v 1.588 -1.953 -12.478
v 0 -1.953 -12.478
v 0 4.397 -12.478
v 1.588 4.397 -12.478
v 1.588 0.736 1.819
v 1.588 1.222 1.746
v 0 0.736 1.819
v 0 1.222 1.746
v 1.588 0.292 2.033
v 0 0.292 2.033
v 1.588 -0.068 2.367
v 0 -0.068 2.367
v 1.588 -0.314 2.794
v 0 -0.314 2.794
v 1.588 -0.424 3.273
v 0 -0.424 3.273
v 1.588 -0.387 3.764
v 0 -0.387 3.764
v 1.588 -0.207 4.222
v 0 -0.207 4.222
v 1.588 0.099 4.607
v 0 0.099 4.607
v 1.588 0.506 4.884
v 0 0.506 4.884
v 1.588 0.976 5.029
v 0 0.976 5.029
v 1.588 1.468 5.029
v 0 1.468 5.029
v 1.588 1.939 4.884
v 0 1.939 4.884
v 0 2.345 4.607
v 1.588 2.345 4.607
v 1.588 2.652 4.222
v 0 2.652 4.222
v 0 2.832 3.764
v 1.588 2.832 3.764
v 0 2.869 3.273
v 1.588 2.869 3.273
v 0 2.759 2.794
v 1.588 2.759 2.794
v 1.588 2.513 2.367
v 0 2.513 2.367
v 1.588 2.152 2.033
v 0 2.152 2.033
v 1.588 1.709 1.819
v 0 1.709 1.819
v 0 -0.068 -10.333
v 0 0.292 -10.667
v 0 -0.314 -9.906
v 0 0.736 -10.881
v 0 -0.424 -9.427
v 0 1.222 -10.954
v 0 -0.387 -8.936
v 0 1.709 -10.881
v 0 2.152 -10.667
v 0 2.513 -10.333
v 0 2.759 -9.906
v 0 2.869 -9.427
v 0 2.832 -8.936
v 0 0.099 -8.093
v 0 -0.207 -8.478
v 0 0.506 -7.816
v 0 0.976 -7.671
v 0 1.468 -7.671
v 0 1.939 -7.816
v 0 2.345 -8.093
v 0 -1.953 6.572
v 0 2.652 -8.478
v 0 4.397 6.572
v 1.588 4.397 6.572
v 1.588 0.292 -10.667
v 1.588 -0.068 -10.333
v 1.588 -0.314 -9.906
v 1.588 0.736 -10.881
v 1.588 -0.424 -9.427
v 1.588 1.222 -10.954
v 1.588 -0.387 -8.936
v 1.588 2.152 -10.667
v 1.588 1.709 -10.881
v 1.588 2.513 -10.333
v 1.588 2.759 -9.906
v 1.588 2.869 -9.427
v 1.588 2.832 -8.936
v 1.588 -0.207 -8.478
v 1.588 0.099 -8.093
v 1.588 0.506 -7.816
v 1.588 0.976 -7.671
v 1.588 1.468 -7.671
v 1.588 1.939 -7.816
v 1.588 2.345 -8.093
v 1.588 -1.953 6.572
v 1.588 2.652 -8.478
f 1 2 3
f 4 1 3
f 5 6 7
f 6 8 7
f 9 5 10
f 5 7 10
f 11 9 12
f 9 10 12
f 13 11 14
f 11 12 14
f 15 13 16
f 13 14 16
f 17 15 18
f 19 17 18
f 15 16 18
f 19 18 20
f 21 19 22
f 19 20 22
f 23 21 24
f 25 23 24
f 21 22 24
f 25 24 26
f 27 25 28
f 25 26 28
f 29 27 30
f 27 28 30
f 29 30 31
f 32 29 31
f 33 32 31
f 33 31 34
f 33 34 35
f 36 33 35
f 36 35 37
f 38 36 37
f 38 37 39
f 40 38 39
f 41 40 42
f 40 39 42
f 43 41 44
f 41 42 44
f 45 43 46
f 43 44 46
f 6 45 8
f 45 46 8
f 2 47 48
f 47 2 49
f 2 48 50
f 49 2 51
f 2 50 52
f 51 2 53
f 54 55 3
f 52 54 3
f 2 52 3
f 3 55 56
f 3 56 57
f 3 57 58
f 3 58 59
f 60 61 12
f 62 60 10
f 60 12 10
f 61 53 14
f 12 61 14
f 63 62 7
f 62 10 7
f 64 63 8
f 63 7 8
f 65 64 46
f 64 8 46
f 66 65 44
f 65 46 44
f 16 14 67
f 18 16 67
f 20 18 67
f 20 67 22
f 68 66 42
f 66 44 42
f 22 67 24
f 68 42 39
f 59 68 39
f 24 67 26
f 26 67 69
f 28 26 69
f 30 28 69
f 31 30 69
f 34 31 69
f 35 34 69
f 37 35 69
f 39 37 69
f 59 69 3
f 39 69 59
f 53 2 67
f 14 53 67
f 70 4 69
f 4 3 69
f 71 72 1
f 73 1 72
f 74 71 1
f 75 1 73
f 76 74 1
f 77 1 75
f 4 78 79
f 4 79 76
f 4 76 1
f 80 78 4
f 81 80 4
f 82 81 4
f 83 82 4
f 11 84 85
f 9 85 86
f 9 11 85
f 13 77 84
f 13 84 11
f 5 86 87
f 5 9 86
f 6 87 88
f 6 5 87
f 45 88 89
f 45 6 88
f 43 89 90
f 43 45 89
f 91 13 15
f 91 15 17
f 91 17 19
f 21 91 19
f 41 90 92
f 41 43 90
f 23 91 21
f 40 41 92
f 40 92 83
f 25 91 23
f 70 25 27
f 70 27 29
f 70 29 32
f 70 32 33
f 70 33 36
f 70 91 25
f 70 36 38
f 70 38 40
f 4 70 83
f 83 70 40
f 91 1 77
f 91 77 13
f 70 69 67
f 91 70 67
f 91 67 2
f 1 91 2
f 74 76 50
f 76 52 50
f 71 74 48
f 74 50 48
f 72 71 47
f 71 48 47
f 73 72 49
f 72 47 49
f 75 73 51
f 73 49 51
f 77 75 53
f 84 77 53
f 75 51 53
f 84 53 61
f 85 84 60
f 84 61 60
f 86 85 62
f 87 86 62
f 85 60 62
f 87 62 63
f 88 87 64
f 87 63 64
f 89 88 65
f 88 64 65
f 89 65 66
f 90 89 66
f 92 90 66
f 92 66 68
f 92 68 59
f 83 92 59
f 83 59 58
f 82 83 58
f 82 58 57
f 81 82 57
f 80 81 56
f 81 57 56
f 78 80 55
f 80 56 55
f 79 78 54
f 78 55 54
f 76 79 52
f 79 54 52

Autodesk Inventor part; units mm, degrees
ref_plane "YZ Plane" through (0, 0, 0) normal (1, 0, 0) x (0, 1, 0)
ref_plane "XZ Plane" through (0, 0, 0) normal (0, 1, 0) x (-1, 0, 0)
ref_plane "XY Plane" through (0, 0, 0) normal (0, 0, 1) x (1, 0, 0)
sketch "Sketch1" plane through (0, 0, 0) normal (1, 0, 0) x (0, 1, 0)
  line L0 (4.3974, 6.5718) -> (-1.9526, 6.5718)
  line L1 (-1.9526, 6.5718) -> (-1.9526, -12.4782)
  line L2 (-1.9526, -12.4782) -> (4.3974, -12.4782)
  line L3 (4.3974, -12.4782) -> (4.3974, 6.5718)
  point P0 (0, 0)
  dimension "d0" = 19.05
  dimension "d1" = 6.35
extrude "Extrusion1" add sketch "Sketch1" along normal blind 1.5875
sketch "Sketch2" plane through (1.5875, 0, 0) normal (1, 0, 0) x (0, 0, -1)
  line L0 (12.4782, 4.3974) -> (-6.5718, 4.3974) projected
  line L1 (-6.5718, 4.3974) -> (-6.5718, -1.9526) projected
  line L2 (12.4782, -1.9526) -> (12.4782, 4.3974) projected
  point P0 (0, 0)
  point P1 (-3.3968, 1.2224)
  point P2 (9.3032, 1.2224)
  dimension "d4" = 3.175
  dimension "d5" = 3.175
  dimension "d6" = 3.175
hole "Hole1" at (1.5875, 1.2224, 3.3968) at (1.5875, 1.2224, -9.3032) direction (-1, 0, 0) diameter 3.302 depth 25.4 tip angle 118.188
properties part number "clampPlate"
